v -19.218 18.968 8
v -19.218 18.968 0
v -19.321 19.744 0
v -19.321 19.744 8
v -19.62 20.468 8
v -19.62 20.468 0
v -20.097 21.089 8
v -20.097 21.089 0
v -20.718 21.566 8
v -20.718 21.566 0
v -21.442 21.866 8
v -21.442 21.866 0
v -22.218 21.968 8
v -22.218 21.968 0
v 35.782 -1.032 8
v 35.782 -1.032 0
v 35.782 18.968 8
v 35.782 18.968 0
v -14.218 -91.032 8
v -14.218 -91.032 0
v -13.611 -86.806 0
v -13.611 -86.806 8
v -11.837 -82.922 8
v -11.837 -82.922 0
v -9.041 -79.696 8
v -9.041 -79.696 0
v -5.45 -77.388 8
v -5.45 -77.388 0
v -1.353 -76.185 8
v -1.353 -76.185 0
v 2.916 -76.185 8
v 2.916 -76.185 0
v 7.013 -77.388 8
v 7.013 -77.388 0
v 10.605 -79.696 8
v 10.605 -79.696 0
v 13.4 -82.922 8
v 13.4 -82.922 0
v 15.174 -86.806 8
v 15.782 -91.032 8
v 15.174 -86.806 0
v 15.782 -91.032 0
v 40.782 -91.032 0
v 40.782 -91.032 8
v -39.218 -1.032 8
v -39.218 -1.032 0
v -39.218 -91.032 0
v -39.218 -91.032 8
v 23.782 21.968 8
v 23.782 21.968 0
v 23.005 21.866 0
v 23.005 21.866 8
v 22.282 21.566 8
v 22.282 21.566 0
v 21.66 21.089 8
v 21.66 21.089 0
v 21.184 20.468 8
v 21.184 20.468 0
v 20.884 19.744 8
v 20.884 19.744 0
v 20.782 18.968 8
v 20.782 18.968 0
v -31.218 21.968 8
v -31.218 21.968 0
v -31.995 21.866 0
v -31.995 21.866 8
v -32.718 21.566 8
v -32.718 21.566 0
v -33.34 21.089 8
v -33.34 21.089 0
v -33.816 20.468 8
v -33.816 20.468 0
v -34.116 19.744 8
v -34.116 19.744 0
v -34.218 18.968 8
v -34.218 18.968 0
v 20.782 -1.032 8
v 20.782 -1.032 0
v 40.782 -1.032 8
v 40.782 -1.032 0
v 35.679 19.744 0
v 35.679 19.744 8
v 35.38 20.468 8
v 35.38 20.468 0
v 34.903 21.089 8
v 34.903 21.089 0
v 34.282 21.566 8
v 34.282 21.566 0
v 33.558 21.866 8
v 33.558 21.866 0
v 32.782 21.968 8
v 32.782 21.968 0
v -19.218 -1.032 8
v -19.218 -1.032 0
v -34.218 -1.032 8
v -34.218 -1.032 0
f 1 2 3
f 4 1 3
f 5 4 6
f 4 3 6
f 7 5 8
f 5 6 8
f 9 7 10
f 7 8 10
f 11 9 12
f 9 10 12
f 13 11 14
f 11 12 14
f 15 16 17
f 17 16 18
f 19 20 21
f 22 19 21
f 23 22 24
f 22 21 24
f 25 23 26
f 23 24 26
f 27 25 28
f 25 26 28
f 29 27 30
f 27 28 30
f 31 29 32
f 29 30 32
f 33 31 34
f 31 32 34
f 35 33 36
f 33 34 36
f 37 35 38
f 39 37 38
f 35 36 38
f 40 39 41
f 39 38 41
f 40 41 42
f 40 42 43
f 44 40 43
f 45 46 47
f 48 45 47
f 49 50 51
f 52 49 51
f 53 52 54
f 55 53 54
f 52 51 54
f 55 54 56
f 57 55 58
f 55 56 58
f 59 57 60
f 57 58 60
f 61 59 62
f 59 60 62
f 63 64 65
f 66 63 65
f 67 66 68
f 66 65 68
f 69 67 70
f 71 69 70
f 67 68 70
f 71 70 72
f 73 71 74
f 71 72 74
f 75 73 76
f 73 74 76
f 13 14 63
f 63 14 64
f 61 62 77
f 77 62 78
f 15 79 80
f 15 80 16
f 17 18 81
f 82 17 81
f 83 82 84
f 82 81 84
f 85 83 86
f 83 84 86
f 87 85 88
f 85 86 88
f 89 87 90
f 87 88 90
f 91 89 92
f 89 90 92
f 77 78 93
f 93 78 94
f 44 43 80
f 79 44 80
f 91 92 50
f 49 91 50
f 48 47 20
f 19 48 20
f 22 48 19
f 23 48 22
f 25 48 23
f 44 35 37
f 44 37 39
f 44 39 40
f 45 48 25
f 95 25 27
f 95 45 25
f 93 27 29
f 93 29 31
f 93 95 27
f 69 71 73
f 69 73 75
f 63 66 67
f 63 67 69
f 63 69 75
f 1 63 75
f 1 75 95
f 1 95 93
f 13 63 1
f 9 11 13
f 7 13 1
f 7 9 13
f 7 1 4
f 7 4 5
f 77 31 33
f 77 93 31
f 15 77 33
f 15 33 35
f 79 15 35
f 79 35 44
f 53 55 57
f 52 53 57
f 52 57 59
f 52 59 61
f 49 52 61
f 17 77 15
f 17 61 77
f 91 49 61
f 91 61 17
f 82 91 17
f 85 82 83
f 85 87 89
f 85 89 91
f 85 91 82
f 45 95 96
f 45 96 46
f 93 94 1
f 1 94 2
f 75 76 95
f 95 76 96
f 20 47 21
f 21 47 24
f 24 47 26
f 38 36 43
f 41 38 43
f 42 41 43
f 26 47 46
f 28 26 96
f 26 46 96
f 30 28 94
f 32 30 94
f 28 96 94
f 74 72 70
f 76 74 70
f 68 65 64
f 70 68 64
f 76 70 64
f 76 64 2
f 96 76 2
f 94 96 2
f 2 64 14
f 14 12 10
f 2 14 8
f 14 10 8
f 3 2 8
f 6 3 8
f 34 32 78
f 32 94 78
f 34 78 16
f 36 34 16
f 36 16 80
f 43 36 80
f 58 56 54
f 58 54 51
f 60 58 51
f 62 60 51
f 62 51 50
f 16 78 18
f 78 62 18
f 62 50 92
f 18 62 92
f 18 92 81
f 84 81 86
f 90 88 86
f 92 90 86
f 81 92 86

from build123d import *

# Parameters (mm, degrees)
F1_DEPTH = 8


with BuildPart() as f1:
    # F0 (on Top) → F1 (new body)
    with BuildSketch(Plane.XY):
        with BuildLine():
            Line((-34.218354, -1.032101), (-39.218354, -1.032101))
            Line((-39.218354, -1.032101), (-39.218354, -91.032101))
            Line((-39.218354, -91.032101), (-14.218354, -91.032101))
            ThreePointArc((-14.218354, -91.032101), (0.781646, -76.032101), (15.781646, -91.032101))
            Line((15.781646, -91.032101), (40.781646, -91.032101))
            Line((40.781646, -91.032101), (40.781646, -1.032101))
            Line((40.781646, -1.032101), (35.781646, -1.032101))
            Line((35.781646, -1.032101), (35.781646, 18.967899))
            ThreePointArc((35.781646, 18.967899), (34.902966, 21.089219), (32.781646, 21.967899))
            Line((32.781646, 21.967899), (23.781646, 21.967899))
            ThreePointArc((23.781646, 21.967899), (21.660325, 21.089219), (20.781646, 18.967899))
            Line((20.781646, 18.967899), (20.781646, -1.032101))
            Line((20.781646, -1.032101), (-17.203856, -1.032101))
            Line((-17.203856, -1.032101), (-19.218354, -1.032101))
            Line((-19.218354, -1.032101), (-19.218354, 18.967899))
            ThreePointArc((-19.218354, 18.967899), (-20.097034, 21.089219), (-22.218354, 21.967899))
            Line((-22.218354, 21.967899), (-31.218354, 21.967899))
            ThreePointArc((-31.218354, 21.967899), (-33.339675, 21.089219), (-34.218354, 18.967899))
            Line((-34.218354, 18.967899), (-34.218354, -1.032101))
        make_face()
    extrude(amount=F1_DEPTH)


solid = f1.part
